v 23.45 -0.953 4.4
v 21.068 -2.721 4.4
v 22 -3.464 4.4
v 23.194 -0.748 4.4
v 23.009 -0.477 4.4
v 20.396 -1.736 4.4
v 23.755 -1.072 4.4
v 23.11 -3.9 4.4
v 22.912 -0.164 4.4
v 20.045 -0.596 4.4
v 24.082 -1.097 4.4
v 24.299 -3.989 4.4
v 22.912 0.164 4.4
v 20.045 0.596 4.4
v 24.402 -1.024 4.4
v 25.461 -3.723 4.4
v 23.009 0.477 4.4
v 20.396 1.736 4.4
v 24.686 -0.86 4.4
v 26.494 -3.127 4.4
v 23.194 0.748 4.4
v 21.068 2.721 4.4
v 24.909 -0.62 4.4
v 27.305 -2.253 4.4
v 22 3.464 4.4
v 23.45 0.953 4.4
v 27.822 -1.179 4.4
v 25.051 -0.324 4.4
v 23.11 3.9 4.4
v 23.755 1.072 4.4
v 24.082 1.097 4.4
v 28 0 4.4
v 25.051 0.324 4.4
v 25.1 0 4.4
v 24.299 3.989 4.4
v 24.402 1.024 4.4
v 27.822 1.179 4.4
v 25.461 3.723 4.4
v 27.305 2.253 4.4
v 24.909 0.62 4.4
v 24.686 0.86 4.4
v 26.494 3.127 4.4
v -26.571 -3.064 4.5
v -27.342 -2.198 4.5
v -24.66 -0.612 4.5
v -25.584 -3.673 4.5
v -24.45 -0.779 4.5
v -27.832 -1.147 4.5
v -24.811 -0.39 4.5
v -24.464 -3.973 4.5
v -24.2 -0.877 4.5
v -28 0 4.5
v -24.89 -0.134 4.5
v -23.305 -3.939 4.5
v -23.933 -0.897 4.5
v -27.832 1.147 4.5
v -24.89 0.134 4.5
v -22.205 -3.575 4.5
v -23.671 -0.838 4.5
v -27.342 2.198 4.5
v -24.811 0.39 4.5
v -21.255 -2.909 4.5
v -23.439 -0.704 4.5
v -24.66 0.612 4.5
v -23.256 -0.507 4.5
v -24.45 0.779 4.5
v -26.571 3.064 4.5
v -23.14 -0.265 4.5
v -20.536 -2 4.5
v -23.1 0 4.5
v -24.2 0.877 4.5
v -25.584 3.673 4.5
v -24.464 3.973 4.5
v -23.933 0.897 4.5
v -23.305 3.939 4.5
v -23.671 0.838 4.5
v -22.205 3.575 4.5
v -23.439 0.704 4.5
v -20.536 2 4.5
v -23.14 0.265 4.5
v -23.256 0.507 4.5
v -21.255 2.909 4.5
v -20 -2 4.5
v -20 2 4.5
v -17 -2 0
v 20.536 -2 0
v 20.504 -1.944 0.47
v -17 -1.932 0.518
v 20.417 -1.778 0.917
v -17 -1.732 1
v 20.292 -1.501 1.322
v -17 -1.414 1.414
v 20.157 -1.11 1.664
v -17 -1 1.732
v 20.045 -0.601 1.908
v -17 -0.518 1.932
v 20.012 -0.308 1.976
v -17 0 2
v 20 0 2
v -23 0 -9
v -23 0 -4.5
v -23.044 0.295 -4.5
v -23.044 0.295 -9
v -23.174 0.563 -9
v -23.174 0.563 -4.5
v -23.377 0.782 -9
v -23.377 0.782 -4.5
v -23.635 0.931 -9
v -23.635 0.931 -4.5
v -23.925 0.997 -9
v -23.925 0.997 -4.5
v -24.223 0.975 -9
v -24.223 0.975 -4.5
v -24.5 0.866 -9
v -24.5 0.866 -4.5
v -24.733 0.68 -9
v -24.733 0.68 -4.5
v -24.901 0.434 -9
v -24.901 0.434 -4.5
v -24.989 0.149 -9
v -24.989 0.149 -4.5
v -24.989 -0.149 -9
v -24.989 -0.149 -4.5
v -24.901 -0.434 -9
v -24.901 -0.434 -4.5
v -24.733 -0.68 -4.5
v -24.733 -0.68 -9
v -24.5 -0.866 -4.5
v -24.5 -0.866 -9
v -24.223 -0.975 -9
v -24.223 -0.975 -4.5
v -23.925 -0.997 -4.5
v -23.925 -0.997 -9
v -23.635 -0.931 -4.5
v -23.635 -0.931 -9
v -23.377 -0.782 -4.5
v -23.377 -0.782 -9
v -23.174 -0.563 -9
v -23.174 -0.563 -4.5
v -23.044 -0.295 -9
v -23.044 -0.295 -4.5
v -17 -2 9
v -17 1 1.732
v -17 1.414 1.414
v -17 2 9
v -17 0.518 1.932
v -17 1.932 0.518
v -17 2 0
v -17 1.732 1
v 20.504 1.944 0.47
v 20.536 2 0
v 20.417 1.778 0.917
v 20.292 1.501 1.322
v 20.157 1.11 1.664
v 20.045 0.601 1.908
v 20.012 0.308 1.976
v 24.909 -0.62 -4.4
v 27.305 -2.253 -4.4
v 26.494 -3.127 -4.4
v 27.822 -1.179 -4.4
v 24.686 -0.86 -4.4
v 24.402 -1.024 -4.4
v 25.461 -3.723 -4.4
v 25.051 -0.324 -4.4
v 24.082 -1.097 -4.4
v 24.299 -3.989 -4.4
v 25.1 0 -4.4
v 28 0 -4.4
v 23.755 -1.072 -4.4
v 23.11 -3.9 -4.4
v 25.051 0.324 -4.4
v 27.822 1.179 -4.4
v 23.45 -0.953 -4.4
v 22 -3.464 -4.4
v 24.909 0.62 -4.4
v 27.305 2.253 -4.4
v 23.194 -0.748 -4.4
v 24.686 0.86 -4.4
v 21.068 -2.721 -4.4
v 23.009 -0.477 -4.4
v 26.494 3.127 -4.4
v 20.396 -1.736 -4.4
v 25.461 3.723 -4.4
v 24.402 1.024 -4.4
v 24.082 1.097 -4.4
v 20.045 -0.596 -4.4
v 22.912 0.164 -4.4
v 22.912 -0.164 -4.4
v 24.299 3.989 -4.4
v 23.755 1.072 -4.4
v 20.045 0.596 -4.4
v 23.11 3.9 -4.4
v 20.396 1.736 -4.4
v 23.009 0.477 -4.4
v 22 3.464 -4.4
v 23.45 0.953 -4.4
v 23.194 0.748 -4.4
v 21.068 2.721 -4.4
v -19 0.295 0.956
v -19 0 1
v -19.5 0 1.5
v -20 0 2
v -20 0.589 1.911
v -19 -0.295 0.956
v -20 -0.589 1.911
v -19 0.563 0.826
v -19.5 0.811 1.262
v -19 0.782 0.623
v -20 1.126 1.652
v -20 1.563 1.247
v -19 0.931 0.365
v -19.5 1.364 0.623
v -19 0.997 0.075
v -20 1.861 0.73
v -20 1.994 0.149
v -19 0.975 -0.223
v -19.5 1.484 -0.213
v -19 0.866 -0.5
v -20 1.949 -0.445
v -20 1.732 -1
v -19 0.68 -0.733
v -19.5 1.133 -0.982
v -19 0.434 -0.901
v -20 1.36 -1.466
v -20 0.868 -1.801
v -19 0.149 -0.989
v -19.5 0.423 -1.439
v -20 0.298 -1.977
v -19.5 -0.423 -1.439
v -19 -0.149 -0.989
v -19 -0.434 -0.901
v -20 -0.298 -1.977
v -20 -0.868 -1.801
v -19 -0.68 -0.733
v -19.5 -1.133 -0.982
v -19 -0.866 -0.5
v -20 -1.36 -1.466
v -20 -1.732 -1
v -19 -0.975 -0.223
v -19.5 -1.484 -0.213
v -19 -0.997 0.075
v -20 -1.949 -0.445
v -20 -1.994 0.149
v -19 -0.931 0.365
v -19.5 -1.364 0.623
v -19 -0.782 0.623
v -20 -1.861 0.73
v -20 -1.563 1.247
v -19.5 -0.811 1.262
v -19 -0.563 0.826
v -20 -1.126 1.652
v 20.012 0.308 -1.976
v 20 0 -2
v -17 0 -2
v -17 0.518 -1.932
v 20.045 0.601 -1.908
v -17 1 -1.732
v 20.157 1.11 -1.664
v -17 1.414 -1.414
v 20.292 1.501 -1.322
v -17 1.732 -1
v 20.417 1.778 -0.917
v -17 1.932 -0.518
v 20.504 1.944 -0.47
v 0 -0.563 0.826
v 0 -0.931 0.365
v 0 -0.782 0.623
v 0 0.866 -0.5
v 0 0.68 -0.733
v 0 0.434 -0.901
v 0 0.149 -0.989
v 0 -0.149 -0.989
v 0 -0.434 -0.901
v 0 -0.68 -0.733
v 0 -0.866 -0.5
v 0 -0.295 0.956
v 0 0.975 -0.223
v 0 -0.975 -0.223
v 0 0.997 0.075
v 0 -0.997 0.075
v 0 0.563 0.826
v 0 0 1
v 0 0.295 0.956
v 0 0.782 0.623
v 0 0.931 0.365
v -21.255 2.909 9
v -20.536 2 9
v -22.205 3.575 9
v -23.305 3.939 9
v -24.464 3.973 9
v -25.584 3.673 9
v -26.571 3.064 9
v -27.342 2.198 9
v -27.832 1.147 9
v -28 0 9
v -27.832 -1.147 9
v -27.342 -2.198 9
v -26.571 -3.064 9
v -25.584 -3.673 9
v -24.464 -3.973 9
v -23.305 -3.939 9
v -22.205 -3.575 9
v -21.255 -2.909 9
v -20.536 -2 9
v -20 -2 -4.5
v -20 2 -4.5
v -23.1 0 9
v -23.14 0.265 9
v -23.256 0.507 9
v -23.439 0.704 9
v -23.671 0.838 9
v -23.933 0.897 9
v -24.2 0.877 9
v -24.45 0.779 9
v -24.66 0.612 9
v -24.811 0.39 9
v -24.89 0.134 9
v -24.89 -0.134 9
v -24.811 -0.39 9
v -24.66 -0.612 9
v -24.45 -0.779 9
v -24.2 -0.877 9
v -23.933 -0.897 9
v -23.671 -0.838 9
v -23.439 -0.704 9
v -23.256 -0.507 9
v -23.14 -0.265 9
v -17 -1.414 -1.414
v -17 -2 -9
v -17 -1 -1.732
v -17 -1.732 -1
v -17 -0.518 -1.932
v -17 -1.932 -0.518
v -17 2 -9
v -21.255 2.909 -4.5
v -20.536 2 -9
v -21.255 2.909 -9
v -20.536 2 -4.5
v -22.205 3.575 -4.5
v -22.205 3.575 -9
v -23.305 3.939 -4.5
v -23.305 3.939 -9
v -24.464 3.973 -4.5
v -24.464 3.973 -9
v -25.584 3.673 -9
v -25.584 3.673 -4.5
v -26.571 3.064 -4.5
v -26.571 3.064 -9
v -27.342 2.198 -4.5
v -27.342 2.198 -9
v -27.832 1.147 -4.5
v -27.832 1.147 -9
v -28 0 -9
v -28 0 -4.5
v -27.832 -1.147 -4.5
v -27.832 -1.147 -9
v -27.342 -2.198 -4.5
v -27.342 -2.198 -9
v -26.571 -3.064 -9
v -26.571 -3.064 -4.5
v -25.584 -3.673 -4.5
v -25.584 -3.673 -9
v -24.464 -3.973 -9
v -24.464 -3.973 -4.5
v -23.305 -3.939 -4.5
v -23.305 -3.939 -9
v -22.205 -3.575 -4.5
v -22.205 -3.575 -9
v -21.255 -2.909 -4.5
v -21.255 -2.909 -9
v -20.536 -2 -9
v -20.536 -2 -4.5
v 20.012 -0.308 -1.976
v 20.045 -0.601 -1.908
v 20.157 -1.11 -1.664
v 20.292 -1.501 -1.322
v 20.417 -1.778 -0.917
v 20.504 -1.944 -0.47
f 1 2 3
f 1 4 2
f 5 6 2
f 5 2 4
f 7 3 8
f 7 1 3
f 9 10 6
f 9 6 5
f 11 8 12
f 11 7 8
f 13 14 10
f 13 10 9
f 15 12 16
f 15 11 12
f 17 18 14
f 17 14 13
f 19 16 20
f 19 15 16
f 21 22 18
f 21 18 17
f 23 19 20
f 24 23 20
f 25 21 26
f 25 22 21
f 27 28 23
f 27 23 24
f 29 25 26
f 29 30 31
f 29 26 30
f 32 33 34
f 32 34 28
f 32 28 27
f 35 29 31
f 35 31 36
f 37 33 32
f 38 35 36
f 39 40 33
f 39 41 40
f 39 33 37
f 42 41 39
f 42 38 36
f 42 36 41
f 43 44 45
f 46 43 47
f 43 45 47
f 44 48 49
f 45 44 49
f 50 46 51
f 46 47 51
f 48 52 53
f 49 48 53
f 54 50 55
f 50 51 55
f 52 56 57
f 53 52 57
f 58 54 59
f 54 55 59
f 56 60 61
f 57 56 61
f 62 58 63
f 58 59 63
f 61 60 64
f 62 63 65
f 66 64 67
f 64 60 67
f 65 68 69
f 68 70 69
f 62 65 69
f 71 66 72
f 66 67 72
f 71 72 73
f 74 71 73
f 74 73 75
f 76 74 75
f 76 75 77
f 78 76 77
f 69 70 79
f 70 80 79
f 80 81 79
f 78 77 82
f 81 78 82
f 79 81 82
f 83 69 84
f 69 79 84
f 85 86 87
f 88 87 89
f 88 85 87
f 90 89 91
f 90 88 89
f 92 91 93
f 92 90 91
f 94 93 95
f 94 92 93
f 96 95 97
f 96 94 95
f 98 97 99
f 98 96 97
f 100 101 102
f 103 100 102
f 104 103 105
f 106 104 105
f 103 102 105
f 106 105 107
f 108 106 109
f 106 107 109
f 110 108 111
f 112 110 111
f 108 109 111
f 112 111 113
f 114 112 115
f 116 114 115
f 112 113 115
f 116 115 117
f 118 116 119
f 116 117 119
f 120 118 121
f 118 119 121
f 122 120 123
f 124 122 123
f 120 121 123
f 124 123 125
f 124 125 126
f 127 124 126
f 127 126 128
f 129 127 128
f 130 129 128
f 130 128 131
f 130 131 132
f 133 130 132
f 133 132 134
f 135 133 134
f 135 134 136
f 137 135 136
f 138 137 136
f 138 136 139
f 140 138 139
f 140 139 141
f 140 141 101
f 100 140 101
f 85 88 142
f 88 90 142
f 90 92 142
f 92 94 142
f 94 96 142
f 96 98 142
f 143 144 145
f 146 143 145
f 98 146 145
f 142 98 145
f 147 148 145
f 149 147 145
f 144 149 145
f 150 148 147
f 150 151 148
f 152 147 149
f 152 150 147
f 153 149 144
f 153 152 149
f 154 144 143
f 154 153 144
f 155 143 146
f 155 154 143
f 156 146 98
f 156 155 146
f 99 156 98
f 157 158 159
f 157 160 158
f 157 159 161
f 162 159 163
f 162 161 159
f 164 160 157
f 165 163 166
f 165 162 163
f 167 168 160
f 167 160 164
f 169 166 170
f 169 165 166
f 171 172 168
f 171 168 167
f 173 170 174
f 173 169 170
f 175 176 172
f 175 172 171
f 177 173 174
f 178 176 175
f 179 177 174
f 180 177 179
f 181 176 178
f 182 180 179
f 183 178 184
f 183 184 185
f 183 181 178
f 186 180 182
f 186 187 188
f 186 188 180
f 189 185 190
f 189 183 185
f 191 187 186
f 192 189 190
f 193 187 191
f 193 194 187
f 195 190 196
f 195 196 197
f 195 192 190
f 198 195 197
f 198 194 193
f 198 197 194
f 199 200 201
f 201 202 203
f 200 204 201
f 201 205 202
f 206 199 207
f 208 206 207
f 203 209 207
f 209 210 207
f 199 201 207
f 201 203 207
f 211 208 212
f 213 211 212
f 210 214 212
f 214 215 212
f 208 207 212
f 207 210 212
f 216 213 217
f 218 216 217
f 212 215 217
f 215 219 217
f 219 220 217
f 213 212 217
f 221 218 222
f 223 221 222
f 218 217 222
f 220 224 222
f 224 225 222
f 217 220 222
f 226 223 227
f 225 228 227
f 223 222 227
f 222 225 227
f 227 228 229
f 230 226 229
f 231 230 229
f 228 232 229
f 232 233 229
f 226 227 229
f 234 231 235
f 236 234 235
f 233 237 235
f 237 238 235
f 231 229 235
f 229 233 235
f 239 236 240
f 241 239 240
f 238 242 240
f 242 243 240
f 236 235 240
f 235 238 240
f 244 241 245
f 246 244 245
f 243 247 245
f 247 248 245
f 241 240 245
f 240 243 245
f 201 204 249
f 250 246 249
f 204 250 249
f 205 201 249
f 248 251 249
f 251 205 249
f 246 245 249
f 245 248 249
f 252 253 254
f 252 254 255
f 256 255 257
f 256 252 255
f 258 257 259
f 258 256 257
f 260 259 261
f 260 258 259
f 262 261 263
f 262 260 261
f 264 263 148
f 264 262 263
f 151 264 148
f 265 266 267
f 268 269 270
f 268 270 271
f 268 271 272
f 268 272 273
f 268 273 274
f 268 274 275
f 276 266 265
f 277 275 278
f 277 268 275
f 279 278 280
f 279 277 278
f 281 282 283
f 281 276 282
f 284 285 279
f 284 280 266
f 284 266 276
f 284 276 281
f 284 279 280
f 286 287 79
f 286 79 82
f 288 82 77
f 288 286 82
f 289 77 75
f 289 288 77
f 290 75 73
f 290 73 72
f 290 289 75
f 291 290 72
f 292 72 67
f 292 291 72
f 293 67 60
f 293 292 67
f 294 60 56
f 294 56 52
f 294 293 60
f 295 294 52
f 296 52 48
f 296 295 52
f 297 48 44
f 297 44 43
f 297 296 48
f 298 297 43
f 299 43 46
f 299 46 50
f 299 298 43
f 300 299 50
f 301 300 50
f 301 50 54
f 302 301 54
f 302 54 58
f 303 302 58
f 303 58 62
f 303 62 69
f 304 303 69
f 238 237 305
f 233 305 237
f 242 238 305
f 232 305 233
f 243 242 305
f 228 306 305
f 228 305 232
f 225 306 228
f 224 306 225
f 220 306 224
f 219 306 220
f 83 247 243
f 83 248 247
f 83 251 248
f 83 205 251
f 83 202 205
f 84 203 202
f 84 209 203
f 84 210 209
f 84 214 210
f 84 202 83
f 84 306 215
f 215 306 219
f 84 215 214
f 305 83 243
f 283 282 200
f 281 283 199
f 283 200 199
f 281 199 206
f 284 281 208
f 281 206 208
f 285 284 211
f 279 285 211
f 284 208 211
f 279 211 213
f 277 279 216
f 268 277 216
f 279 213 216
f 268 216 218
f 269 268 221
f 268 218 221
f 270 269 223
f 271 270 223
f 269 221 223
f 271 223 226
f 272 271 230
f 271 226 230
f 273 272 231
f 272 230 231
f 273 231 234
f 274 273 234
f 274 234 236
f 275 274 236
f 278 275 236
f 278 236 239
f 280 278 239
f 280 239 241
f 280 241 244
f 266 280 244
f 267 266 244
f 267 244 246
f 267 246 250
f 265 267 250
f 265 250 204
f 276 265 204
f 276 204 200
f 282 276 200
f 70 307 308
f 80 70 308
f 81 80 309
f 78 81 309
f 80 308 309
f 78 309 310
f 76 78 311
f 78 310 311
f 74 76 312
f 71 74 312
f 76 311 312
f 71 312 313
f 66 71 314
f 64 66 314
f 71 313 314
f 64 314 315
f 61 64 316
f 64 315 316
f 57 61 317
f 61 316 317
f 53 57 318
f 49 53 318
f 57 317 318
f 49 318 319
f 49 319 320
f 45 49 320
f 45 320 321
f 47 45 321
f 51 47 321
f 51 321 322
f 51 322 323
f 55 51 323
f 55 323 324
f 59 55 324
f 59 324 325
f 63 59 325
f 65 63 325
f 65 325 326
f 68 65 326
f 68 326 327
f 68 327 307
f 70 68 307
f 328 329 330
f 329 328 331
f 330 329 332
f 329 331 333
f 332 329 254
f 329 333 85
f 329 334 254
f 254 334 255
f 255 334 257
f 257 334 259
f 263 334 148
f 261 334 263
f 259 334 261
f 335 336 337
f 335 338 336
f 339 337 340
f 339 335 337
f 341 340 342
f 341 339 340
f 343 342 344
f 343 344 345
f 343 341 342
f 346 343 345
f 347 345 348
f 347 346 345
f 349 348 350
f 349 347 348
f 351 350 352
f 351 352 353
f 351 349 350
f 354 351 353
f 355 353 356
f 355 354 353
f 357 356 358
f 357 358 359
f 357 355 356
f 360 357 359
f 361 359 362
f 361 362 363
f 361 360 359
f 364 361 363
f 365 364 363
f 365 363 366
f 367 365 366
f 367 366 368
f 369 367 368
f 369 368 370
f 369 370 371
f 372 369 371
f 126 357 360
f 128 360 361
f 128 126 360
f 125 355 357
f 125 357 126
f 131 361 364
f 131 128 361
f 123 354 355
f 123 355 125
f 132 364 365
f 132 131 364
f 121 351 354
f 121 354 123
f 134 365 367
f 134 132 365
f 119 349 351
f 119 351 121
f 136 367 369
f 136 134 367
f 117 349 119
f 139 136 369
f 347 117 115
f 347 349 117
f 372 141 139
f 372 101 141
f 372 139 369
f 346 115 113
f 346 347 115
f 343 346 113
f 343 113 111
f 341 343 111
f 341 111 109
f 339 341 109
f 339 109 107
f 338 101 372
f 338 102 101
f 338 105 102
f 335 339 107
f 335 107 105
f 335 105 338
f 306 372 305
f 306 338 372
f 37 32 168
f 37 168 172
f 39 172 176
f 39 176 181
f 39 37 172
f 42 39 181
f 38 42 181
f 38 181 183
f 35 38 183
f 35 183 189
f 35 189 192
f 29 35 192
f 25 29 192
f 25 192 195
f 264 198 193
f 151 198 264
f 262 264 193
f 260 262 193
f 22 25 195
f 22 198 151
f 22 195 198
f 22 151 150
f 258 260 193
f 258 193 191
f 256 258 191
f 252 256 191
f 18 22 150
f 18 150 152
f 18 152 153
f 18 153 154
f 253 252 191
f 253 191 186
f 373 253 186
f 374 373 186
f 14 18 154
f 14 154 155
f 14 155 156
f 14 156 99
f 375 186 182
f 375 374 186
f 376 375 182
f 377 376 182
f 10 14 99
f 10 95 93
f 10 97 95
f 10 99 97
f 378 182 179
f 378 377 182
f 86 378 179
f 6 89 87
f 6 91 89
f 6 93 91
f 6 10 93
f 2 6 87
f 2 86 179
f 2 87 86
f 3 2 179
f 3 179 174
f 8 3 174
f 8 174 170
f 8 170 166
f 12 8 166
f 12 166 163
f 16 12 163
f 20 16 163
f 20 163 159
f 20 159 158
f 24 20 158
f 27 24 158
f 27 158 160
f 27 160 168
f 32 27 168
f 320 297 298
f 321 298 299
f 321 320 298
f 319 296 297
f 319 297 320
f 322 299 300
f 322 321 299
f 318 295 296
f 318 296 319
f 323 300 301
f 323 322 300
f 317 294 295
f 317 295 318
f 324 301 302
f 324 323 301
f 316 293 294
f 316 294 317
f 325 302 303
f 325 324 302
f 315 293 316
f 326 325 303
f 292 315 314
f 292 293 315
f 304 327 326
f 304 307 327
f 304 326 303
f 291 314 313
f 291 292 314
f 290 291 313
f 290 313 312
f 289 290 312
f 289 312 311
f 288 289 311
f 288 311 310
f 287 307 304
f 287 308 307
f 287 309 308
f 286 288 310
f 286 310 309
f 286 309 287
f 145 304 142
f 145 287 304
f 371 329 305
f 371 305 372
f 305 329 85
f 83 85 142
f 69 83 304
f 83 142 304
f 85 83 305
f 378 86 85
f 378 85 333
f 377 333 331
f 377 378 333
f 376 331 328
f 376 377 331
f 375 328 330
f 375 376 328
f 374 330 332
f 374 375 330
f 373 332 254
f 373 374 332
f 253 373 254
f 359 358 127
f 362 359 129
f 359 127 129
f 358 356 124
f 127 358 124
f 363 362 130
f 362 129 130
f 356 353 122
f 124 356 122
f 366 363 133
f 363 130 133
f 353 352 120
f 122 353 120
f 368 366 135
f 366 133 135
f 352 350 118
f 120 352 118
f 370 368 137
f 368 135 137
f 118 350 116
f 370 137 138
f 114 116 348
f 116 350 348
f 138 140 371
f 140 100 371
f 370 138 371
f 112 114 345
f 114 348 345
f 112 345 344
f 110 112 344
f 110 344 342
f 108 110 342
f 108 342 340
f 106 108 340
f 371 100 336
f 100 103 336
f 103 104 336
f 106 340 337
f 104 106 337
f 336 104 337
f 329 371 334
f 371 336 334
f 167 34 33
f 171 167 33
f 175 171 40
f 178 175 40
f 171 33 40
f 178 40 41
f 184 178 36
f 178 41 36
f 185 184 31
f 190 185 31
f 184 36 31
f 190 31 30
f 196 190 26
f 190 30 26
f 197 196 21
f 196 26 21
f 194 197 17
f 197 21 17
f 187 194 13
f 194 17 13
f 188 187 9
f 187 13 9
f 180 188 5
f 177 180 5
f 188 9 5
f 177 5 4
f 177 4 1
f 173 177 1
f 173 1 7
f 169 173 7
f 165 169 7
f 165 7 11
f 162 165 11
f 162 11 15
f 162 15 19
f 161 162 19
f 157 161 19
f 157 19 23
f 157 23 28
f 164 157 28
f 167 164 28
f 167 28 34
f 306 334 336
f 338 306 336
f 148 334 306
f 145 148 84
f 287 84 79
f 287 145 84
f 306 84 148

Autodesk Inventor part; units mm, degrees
ref_plane "YZ Plane" through (0, 0, 0) normal (1, 0, 0) x (0, 1, 0)
ref_plane "XZ Plane" through (0, 0, 0) normal (0, 1, 0) x (-1, 0, 0)
ref_plane "XY Plane" through (0, 0, 0) normal (0, 0, 1) x (1, 0, 0)
sketch "Sketch1" plane through (0, 0, 0) normal (0, 0, 1) x (1, 0, 0)
  circle A0 centre (-24, 0) radius 1
  circle A1 centre (24, 0) radius 1
  circle A2 centre (-24, 0) radius 4
  circle A3 centre (24, 0) radius 4
  point P0 (0, 0)
  dimension "d0" = 2
  dimension "d1" = 2
  dimension "d3" = 48
  dimension "d4" = 24
  dimension "d5" = 8
  dimension "d6" = 8
extrude "Extrusion1" add sketch "Sketch1" against normal mid plane 18
sketch "Sketch2" plane through (0, 0, 0) normal (0, 0, 1) x (1, 0, 0)
  circle A0 centre (-24, 0) radius 4 projected
  circle A1 centre (-24, 0) radius 1 projected
  point P0 (0, 0)
extrude "Extrusion2" cut sketch "Sketch2" against normal mid plane 9
sketch "Sketch3" plane through (-24, 0, -4.5) normal (0, 0, 1) x (1, 0, 0)
  circle A0 centre (48, 0) radius 4 projected
  circle A1 centre (48, 0) radius 4 projected
  circle A2 centre (48, 0) radius 1 projected
  point P0 (24, 0)
extrude "Extrusion3" cut sketch "Sketch3" against normal blind 4.5
mirror "Mirror1" about plane through (0, 0, 0) normal (0, 0, 1) of "Extrusion3"
sketch "Sketch6" plane through (0, 0, 0) normal (0, 1, 0) x (-1, 0, 0)
  line L0 (-20, -4.5) -> (-23, -4.5) construction
  line L1 (-23, -4.5) -> (-23, 4.5) construction
  line L2 (-23, 4.5) -> (-20, 4.5) construction
  line L3 (-20, 4.5) -> (-20, -4.5) construction
  line L4 (-25, -4.5) -> (-28, -4.5) construction
  line L5 (-28, -4.5) -> (-28, 4.5) construction
  line L6 (-28, 4.5) -> (-25, 4.5) construction
  line L7 (-25, 4.5) -> (-25, -4.5) construction
  line L8 (20, 9) -> (23, 9) construction
  line L9 (23, 9) -> (23, 4.5) construction
  line L10 (23, 4.5) -> (20, 4.5) construction
  line L11 (20, 4.5) -> (20, 9) construction
  line L12 (25, 9) -> (28, 9) construction
  line L13 (28, 9) -> (28, 4.5) construction
  line L14 (28, 4.5) -> (25, 4.5) construction
  line L15 (25, 4.5) -> (25, 9) construction
  line L16 (28, -9) -> (25, -9) construction
  line L17 (25, -9) -> (25, -4.5) construction
  line L18 (25, -4.5) -> (28, -4.5) construction
  line L19 (28, -4.5) -> (28, -9) construction
  line L20 (23, -9) -> (20, -9) construction
  line L21 (20, -9) -> (20, -4.5) construction
  line L22 (20, -4.5) -> (23, -4.5) construction
  line L23 (23, -4.5) -> (23, -9) construction
  line L24 (20, -9) -> (28, -9) construction
  line L25 (20, -9) -> (17, -9)
  line L26 (17, -9) -> (17, -2)
  line L27 (17, -2) -> (-20, -2)
  line L28 (-20, 4.5) -> (-20, -4.5) construction
  line L29 (-20, 2) -> (17, 2)
  line L30 (17, 2) -> (17, 9)
  line L31 (17, 9) -> (20, 9)
  line L32 (20, -4.5) -> (28, -4.5) construction
  line L33 (20, -4.5) -> (20, 4.5)
  line L34 (-20, -2) -> (-23, -2)
  line L35 (-23, -4.5) -> (-23, 4.5) projected
  line L36 (-20, 2) -> (-23, 2)
  line L37 (20, -9) -> (23, -9)
  line L38 (23, -4.5) -> (20, -4.5)
  line L39 (25, -4.5) -> (23, -4.5) projected
  line L40 (23, -4.5) -> (23, -9)
  line L41 (23, -9) -> (23, -4.5) projected
  line L42 (23, 4.5) -> (25, 4.5) projected
  line L43 (28, 4.5) -> (20, 4.5) projected
  line L44 (23, 4.5) -> (20, 4.5)
  line L45 (23, 9) -> (25, 9) projected
  line L46 (23, 4.5) -> (23, 9)
  line L47 (28, 9) -> (20, 9) projected
  line L48 (23, 9) -> (20, 9)
  point P0 (0, 0)
  dimension "d16" = 3
  dimension "d17" = 4
  dimension "d18" = 2
extrude "Extrusion4" add sketch "Sketch6" against normal mid plane 4
sketch "Sketch7" plane through (-20, -2, -4.5) normal (-1, 0, 0) x (0, 0, 1)
  circle A0 centre (4.5, 2) radius 1
  dimension "d21" = 2
extrude "Extrusion5" cut sketch "Sketch7" against normal blind 20
chamfer "Chamfer1" distance 1 angle 45 1 edges at (-20, 0, -1)
fillet "Fillet1" radius 2 4 edges at (1.7679, 2, 2) (1.7679, 2, -2) (1.7679, -2, -2) (1.7679, -2, 2)
sketch "Sketch9" plane through (0, 0, 9) normal (0, 0, 1) x (1, 0, 0)
  circle A0 centre (-24, 0) radius 1 projected
  circle A1 centre (-24, 0) radius 0.9
  point P0 (0, 0)
  dimension "d29" = 1.8
extrude "TREAD" add sketch "Sketch9" against normal up to surface (4.5 mm away)
sketch "Sketch11" plane through (24, 0, 4.5) normal (0, 0, 1) x (1, 0, 0)
  circle A0 centre (0, 0) radius 4 projected
  circle A1 centre (0, 0) radius 1 projected
  point P0 (-24, 0)
extrude "thin" cut sketch "Sketch11" against normal blind 0.1
mirror "Mirror2" about plane through (0, 0, 0) normal (0, 0, 1) of "thin"
sketch "Sketch12" plane through (24, 0, 4.4) normal (0, 0, 1) x (1, 0, 0)
  circle A0 centre (0, 0) radius 1 construction
  circle A1 centre (0, 0) radius 1.1
  point P0 (-24, 0)
  dimension "d34" = 2.2
extrude "Extrusion8" cut sketch "Sketch12" against normal up to surface (8.8 mm away)
equation "\"d4\" = 0.5 * d3"
equation "\"d6\" = d5"
equation "\"d18\" = 0.5 * d17"
properties part number "Tolerenced_Phalalnge_48mm"
